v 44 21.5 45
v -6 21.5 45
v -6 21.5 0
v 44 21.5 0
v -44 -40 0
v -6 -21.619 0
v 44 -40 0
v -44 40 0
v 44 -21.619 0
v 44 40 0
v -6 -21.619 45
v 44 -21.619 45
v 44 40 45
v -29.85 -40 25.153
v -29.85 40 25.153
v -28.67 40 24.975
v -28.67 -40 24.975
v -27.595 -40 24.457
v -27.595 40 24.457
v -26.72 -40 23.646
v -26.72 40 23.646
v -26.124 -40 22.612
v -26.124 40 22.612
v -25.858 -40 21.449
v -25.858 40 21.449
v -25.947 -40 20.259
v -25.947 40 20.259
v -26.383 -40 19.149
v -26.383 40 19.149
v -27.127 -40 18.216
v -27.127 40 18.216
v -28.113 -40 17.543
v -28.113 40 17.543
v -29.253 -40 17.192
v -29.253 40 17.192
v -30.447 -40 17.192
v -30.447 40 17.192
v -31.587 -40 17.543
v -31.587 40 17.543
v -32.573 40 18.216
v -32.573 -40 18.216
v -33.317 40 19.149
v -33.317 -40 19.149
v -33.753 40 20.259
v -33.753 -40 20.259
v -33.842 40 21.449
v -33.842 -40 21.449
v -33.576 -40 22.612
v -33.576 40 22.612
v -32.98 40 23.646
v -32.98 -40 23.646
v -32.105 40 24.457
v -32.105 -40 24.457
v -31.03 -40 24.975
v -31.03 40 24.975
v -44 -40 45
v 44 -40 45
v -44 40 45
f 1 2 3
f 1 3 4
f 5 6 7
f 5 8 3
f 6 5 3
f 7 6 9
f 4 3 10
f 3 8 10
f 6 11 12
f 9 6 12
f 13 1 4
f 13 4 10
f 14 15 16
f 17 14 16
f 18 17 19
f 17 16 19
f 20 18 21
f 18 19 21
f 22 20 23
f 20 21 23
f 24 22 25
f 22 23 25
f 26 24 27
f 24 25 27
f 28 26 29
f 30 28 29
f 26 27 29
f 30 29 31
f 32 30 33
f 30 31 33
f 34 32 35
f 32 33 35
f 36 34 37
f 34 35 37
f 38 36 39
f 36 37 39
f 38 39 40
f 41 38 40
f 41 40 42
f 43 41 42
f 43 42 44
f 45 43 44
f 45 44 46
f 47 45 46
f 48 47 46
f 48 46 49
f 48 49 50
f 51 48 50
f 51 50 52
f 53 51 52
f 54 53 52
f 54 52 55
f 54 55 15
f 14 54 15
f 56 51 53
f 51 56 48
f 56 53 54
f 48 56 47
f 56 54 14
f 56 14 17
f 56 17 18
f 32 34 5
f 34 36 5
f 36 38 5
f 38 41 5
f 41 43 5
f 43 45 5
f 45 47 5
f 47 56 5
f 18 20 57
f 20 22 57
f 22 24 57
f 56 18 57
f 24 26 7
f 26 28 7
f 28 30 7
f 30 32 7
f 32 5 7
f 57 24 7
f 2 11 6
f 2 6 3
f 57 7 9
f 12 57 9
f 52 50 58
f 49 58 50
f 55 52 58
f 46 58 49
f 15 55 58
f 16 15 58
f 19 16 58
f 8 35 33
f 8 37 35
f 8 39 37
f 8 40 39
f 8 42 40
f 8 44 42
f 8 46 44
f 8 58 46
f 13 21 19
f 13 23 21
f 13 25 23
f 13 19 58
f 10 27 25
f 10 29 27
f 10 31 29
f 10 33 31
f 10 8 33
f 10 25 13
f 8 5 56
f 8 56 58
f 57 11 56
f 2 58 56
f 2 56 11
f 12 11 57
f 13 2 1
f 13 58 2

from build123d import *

# Parameters (mm, degrees)
IZIM1_W                     = 88
IZIM1_H                     = 80
Y_KSEKLIK_EKSTR_ZYON1_DEPTH = 45
IZIM2_W                     = 50
IZIM2_H                     = 43.119063511
KES_EKSTR_ZYON1_DEPTH       = 75.57211275
IZIM3_R                     = 4.00297174
KES_EKSTR_ZYON2_DEPTH       = 102.788997441


with BuildPart() as part:
    # Çizim1 → Yükseklik-Ekstrüzyon1 (new body)
    with BuildSketch(Plane.XY):
        Rectangle(IZIM1_W, IZIM1_H)
    extrude(amount=Y_KSEKLIK_EKSTR_ZYON1_DEPTH)

    # Çizim2 → Kes-Ekstrüzyon1 (cut, through all)
    with BuildSketch(Plane.XY.offset(45)):
        with Locations((19, -0.059531756)):
            Rectangle(IZIM2_W, IZIM2_H)
    extrude(amount=-KES_EKSTR_ZYON1_DEPTH, mode=Mode.SUBTRACT)

    # Çizim3 → Kes-Ekstrüzyon2 (cut, through all)
    with BuildSketch(Plane(origin=(0, 40, 0), x_dir=(1, 0, 0), z_dir=(0, 1, 0))):
        with Locations(Location((-29.85, -21.15, 0), (0, 0, 270))):
            Circle(IZIM3_R)
    extrude(amount=-KES_EKSTR_ZYON2_DEPTH, mode=Mode.SUBTRACT)


solid = part.part
